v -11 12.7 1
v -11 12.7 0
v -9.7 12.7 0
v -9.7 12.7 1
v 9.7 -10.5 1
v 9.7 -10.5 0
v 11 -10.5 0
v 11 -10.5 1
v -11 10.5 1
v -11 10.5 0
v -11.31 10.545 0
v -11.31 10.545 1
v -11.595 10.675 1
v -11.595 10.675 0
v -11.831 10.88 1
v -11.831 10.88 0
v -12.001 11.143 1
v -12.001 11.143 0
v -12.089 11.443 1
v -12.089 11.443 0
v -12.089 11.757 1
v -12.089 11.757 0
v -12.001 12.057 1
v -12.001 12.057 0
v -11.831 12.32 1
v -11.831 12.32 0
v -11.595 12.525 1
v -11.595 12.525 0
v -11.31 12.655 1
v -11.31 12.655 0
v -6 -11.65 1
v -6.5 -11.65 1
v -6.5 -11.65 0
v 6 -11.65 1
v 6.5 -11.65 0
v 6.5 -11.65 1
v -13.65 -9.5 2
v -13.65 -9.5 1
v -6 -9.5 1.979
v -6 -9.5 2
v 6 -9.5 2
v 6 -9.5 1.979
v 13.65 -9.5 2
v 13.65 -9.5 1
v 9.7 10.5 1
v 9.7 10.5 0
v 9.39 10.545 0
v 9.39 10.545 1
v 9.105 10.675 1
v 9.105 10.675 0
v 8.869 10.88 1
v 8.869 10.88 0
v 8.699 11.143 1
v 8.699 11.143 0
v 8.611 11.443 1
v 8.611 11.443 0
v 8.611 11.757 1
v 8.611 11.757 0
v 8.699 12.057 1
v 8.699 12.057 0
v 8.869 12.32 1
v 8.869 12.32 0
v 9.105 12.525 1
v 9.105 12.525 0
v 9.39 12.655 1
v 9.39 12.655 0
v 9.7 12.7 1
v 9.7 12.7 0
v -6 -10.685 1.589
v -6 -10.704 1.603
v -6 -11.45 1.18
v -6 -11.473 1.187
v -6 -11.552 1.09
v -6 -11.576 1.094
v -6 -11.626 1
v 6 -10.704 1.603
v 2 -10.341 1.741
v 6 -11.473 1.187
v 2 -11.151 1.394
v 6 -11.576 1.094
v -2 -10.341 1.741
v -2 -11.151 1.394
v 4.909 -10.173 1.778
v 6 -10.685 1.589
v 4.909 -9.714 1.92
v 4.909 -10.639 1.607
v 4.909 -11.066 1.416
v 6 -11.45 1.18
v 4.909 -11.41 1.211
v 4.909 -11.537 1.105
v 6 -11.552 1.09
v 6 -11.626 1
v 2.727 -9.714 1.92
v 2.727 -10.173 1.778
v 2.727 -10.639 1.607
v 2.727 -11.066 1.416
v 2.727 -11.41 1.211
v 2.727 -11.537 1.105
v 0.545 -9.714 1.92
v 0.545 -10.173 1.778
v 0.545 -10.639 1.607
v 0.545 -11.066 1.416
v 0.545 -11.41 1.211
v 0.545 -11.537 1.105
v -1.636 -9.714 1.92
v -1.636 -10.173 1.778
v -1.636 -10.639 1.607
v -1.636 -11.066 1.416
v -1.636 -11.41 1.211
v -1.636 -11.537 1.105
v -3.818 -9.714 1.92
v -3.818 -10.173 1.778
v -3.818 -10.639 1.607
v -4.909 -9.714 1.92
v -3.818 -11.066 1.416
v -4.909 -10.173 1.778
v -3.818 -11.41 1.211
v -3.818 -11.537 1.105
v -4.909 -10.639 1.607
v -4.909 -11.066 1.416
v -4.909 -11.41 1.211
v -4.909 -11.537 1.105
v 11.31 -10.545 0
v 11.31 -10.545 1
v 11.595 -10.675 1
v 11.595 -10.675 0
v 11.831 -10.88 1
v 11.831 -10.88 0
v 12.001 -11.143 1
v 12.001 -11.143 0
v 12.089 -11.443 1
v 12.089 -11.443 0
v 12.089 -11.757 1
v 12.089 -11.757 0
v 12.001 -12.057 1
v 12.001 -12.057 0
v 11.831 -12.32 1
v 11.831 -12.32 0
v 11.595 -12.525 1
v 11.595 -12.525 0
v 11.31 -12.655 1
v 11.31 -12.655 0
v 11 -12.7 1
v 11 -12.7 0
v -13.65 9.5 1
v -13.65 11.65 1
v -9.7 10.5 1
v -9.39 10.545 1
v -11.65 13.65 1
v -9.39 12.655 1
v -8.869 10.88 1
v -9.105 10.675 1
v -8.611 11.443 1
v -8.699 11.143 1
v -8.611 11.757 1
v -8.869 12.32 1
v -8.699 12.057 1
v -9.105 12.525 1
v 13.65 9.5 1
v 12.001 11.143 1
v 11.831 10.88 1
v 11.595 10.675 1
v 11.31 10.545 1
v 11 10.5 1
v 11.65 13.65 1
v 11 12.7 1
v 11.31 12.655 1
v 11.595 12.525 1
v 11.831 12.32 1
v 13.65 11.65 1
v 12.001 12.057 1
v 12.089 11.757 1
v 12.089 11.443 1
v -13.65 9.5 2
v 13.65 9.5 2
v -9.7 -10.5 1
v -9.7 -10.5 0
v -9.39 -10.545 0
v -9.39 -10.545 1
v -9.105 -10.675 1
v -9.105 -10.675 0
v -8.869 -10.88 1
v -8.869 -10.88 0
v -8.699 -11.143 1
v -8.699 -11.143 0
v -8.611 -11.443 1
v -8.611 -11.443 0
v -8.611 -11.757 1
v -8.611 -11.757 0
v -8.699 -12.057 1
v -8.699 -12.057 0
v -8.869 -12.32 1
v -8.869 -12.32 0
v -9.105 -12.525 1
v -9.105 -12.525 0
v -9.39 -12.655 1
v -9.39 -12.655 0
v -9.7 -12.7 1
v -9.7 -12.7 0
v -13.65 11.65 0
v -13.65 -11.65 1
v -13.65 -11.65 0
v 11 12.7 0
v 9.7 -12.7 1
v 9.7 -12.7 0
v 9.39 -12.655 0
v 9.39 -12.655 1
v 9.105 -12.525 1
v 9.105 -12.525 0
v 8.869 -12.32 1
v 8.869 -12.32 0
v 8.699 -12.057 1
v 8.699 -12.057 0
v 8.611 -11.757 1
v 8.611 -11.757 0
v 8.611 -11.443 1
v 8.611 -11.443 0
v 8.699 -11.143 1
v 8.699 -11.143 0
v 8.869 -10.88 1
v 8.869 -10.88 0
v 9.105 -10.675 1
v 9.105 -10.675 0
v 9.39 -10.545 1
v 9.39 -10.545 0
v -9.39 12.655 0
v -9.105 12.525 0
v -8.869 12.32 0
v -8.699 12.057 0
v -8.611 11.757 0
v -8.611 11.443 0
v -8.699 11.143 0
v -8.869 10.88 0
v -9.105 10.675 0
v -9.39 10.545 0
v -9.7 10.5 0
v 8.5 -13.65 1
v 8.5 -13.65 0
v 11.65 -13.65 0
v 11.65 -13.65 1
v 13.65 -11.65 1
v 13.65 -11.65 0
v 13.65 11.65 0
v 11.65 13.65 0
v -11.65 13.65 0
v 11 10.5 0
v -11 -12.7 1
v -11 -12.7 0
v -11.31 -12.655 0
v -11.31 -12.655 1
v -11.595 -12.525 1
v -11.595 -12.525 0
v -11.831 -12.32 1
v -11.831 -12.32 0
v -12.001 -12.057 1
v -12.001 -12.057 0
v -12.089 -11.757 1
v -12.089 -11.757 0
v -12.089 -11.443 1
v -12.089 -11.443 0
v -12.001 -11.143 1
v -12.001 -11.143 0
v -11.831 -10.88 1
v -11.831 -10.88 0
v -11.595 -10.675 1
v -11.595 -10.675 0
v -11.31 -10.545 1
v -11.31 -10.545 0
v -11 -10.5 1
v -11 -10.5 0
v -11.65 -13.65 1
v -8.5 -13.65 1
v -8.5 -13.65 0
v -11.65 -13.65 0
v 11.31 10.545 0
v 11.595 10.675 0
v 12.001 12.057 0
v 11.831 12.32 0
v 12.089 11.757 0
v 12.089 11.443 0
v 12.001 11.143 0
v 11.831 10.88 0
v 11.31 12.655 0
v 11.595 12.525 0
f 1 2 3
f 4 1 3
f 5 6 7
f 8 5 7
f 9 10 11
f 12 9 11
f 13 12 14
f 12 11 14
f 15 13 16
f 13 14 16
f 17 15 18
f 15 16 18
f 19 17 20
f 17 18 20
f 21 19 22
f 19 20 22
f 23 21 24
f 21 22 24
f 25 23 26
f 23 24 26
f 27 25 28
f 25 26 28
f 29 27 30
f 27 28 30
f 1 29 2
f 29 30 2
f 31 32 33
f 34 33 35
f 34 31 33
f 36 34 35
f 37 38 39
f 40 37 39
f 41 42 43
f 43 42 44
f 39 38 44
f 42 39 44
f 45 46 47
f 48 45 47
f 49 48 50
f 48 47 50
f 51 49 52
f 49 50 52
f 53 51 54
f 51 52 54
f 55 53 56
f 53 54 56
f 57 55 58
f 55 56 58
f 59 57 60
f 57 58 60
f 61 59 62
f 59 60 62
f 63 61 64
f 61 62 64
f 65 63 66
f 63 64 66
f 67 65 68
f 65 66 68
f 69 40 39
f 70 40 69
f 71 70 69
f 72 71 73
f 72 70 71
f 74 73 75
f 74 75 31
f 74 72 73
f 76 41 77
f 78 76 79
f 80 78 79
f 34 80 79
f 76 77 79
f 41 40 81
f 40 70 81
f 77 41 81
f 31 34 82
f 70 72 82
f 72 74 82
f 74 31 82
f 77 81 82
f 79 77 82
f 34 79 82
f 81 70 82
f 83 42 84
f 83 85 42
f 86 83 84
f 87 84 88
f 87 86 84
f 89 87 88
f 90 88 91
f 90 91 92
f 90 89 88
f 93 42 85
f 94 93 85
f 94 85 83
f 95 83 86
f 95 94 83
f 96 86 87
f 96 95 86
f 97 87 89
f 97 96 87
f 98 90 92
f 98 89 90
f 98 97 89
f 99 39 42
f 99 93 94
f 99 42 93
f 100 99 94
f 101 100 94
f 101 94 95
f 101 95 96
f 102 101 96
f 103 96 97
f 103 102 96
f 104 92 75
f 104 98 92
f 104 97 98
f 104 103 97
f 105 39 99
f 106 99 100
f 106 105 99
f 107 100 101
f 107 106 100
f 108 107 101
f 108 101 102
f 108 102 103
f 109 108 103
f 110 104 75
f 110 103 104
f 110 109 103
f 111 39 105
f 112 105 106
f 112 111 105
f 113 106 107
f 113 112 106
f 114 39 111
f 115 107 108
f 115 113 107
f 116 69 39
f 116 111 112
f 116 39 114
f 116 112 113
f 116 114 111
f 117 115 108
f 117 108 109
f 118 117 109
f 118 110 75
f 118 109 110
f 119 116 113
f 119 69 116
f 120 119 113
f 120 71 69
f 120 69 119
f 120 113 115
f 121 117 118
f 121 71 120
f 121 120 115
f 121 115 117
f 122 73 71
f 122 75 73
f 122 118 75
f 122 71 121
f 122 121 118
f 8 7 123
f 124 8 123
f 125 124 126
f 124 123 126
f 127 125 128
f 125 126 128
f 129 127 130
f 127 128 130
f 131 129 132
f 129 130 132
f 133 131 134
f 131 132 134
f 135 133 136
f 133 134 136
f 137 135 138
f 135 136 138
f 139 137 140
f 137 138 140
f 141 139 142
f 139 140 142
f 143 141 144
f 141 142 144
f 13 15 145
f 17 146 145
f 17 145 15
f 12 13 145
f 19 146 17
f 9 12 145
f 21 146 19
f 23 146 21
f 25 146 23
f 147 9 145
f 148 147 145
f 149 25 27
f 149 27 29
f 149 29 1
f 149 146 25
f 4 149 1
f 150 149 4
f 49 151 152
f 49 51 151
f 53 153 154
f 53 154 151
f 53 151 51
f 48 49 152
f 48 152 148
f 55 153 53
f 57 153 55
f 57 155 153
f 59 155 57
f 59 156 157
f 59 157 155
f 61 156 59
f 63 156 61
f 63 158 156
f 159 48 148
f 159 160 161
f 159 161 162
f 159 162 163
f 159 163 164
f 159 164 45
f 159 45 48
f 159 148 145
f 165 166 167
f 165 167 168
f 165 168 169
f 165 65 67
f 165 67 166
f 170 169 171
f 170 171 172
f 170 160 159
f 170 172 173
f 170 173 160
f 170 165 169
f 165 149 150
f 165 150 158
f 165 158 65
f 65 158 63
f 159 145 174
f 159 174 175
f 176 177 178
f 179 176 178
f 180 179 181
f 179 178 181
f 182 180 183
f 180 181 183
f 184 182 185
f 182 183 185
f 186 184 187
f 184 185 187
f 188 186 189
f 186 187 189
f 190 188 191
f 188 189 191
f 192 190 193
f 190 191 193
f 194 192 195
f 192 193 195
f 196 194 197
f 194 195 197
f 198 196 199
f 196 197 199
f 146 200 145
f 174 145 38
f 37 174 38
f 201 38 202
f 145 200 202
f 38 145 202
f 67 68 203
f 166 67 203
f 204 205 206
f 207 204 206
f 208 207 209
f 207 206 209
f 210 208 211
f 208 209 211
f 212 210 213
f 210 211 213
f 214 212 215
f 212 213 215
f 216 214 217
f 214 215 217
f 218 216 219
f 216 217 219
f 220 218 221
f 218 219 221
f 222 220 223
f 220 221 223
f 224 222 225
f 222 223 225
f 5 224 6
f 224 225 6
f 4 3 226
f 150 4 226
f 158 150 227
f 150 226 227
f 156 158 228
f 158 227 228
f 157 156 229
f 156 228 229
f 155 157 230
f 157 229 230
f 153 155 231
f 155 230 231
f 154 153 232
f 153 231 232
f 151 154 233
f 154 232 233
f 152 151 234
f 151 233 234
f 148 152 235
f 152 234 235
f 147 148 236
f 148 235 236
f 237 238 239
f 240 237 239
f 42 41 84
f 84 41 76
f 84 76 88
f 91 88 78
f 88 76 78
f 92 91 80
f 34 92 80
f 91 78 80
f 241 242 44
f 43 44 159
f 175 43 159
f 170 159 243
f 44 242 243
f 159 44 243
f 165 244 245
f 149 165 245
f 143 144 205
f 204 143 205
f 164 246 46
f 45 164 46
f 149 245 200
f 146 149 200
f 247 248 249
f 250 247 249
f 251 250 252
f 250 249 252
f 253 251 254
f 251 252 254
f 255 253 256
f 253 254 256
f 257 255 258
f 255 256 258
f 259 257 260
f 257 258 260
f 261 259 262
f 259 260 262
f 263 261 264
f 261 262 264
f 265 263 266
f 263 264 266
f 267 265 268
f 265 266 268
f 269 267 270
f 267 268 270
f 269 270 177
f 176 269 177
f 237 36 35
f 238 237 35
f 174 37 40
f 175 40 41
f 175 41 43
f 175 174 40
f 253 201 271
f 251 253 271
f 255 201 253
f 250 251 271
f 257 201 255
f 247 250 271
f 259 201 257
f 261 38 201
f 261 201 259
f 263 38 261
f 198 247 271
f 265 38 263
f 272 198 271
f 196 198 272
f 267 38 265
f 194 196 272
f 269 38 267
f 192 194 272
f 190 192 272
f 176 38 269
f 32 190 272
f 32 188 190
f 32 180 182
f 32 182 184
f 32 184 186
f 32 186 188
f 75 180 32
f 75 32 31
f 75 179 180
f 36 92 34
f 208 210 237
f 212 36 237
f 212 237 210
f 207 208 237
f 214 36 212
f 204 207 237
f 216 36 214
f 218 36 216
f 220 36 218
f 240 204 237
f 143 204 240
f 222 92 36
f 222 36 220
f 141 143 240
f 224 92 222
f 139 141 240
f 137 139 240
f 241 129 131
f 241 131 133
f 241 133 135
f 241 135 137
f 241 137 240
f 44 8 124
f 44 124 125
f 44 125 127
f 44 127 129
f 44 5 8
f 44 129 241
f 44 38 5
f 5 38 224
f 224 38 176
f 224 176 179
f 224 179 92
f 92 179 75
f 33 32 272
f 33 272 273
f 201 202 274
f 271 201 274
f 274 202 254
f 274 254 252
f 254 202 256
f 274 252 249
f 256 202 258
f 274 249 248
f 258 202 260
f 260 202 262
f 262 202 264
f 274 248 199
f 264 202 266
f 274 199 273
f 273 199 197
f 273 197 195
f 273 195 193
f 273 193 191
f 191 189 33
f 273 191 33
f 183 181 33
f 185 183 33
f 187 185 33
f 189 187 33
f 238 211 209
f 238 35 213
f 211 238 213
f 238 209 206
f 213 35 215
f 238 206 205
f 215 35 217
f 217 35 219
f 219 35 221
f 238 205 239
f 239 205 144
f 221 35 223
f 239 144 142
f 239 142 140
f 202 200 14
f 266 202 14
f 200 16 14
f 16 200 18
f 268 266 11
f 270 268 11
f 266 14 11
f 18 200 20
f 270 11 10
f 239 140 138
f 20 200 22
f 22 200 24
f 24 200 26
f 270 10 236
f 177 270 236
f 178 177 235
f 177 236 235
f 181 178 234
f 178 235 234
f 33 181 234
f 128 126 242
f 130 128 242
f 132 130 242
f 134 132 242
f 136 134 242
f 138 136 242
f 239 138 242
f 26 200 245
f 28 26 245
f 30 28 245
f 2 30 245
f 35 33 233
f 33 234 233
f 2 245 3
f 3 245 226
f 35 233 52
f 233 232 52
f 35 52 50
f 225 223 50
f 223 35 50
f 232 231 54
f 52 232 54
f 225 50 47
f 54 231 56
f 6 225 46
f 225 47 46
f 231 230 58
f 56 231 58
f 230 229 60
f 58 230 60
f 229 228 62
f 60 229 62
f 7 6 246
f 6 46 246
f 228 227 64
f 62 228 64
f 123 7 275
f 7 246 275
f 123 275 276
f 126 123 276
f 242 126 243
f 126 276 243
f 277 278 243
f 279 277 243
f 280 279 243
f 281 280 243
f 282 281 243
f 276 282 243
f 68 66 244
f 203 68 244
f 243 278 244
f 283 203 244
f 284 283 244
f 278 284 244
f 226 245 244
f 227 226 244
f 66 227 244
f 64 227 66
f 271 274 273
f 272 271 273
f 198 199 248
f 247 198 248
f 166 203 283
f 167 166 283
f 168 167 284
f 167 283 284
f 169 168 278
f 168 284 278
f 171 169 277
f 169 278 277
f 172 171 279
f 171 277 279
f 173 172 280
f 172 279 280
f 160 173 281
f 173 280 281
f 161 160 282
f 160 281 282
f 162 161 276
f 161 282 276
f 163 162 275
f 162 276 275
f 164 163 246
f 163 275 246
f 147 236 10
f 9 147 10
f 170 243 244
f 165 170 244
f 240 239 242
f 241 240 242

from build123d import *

# Parameters (mm, degrees)
BOSS_EXTRU_1_DEPTH      = 1
ESQUISSE2_W             = 13
ESQUISSE2_H             = 2
ENL_V_MAT_EXTRU_1_DEPTH = 1
CHANFREIN1_SIZE         = 2
ESQUISSE3_W             = 27.3
ESQUISSE3_H             = 19
BOSS_EXTRU_2_DEPTH      = 1
EPAISSIR1_START         = -6
EPAISSIR1_DEPTH         = 12


# Read off the part's stored shape, not the designer's step: Epaissir1
with BuildPart() as part:
    # Esquisse1 → Boss.-Extru.1 (new body)
    with BuildSketch(Plane.XY):
        Polygon((-11.65, -13.65), (11.65, -13.65), (13.65, -11.65), (13.65, 11.65), (11.65, 13.65), (-11.65, 13.65), (-13.65, 11.65), (-13.65, -11.65), align=None)
        with BuildLine():
            Line((-11, 12.7), (-9.7, 12.7))
            ThreePointArc((-9.7, 12.7), (-8.6, 11.6), (-9.7, 10.5))
            Line((-9.7, 10.5), (-11, 10.5))
            ThreePointArc((-11, 10.5), (-12.1, 11.6), (-11, 12.7))
        make_face(mode=Mode.SUBTRACT)
        with BuildLine():
            Line((11, 10.5), (9.7, 10.5))
            ThreePointArc((9.7, 10.5), (8.6, 11.6), (9.7, 12.7))
            Line((9.7, 12.7), (11, 12.7))
            ThreePointArc((11, 12.7), (12.1, 11.6), (11, 10.5))
        make_face(mode=Mode.SUBTRACT)
        with BuildLine():
            Line((-9.7, -12.7), (-11, -12.7))
            ThreePointArc((-11, -12.7), (-12.1, -11.6), (-11, -10.5))
            Line((-11, -10.5), (-9.7, -10.5))
            ThreePointArc((-9.7, -10.5), (-8.6, -11.6), (-9.7, -12.7))
        make_face(mode=Mode.SUBTRACT)
        with BuildLine():
            Line((11, -12.7), (9.7, -12.7))
            ThreePointArc((9.7, -12.7), (8.6, -11.6), (9.7, -10.5))
            Line((9.7, -10.5), (11, -10.5))
            ThreePointArc((11, -10.5), (12.1, -11.6), (11, -12.7))
        make_face(mode=Mode.SUBTRACT)
    extrude(amount=BOSS_EXTRU_1_DEPTH)

    # Esquisse2 → Enlèv. mat.-Extru.1 (cut)
    with BuildSketch(Plane.XY.offset(1)):
        with Locations((0, -12.65)):
            Rectangle(ESQUISSE2_W, ESQUISSE2_H)
    extrude(amount=-ENL_V_MAT_EXTRU_1_DEPTH, mode=Mode.SUBTRACT)

    # Chanfrein1
    chanfrein1_edges = [part.edges().sort_by_distance(p)[0] for p in [
        (6.5, -13.65, 0.5),
        (-6.5, -13.65, 0.5),
    ]]
    chamfer(chanfrein1_edges, length=CHANFREIN1_SIZE - 0.0001)  # a hair under: the kernel refuses the full size

    # Esquisse3 → Boss.-Extru.2 (add)
    with BuildSketch(Plane.XY.offset(1)):
        Rectangle(ESQUISSE3_W, ESQUISSE3_H)
    extrude(amount=BOSS_EXTRU_2_DEPTH)

    # Epaissir1 outline → Epaissir1 (add)
    with BuildSketch(Plane.YZ.offset(EPAISSIR1_START)):
        with BuildLine():
            add(Edge.make_bspline(
                [(-9.499999995, 1.979316014), (-9.705853917, 1.92496296), (-9.931420369, 1.860310756), (-10.169329786, 1.786375477), (-10.412025746, 1.704596537), (-10.652655847, 1.615090027), (-10.882677939, 1.520886463), (-11.096569941, 1.420298319), (-11.284403569, 1.317540699), (-11.441426278, 1.21133535), (-11.557190783, 1.104332165), (-11.626236767, 1.000000099)],
                knots=[0.002227245, 0.002227245, 0.002227245, 0.002227245, 0.002227245, 0.002227245, 0.002227245, 0.002227245, 0.002227245, 0.002227245, 0.002227245, 0.002227245, 0.990890106, 0.990890106, 0.990890106, 0.990890106, 0.990890106, 0.990890106, 0.990890106, 0.990890106, 0.990890106, 0.990890106, 0.990890106, 0.990890106], degree=11))
            Line((-9.499999995, 1.979316014), (-9.5, 2))
            add(Edge.make_bspline(
                [(-9.5, 2), (-10.263312196, 1.798883013), (-11.398783911, 1.403961588), (-11.65, 1)],
                knots=[0, 0, 0, 0, 1, 1, 1, 1], degree=3))
            Line((-11.65, 1), (-11.626236767, 1.000000099))
        make_face()
    extrude(amount=EPAISSIR1_DEPTH)


solid = part.part
